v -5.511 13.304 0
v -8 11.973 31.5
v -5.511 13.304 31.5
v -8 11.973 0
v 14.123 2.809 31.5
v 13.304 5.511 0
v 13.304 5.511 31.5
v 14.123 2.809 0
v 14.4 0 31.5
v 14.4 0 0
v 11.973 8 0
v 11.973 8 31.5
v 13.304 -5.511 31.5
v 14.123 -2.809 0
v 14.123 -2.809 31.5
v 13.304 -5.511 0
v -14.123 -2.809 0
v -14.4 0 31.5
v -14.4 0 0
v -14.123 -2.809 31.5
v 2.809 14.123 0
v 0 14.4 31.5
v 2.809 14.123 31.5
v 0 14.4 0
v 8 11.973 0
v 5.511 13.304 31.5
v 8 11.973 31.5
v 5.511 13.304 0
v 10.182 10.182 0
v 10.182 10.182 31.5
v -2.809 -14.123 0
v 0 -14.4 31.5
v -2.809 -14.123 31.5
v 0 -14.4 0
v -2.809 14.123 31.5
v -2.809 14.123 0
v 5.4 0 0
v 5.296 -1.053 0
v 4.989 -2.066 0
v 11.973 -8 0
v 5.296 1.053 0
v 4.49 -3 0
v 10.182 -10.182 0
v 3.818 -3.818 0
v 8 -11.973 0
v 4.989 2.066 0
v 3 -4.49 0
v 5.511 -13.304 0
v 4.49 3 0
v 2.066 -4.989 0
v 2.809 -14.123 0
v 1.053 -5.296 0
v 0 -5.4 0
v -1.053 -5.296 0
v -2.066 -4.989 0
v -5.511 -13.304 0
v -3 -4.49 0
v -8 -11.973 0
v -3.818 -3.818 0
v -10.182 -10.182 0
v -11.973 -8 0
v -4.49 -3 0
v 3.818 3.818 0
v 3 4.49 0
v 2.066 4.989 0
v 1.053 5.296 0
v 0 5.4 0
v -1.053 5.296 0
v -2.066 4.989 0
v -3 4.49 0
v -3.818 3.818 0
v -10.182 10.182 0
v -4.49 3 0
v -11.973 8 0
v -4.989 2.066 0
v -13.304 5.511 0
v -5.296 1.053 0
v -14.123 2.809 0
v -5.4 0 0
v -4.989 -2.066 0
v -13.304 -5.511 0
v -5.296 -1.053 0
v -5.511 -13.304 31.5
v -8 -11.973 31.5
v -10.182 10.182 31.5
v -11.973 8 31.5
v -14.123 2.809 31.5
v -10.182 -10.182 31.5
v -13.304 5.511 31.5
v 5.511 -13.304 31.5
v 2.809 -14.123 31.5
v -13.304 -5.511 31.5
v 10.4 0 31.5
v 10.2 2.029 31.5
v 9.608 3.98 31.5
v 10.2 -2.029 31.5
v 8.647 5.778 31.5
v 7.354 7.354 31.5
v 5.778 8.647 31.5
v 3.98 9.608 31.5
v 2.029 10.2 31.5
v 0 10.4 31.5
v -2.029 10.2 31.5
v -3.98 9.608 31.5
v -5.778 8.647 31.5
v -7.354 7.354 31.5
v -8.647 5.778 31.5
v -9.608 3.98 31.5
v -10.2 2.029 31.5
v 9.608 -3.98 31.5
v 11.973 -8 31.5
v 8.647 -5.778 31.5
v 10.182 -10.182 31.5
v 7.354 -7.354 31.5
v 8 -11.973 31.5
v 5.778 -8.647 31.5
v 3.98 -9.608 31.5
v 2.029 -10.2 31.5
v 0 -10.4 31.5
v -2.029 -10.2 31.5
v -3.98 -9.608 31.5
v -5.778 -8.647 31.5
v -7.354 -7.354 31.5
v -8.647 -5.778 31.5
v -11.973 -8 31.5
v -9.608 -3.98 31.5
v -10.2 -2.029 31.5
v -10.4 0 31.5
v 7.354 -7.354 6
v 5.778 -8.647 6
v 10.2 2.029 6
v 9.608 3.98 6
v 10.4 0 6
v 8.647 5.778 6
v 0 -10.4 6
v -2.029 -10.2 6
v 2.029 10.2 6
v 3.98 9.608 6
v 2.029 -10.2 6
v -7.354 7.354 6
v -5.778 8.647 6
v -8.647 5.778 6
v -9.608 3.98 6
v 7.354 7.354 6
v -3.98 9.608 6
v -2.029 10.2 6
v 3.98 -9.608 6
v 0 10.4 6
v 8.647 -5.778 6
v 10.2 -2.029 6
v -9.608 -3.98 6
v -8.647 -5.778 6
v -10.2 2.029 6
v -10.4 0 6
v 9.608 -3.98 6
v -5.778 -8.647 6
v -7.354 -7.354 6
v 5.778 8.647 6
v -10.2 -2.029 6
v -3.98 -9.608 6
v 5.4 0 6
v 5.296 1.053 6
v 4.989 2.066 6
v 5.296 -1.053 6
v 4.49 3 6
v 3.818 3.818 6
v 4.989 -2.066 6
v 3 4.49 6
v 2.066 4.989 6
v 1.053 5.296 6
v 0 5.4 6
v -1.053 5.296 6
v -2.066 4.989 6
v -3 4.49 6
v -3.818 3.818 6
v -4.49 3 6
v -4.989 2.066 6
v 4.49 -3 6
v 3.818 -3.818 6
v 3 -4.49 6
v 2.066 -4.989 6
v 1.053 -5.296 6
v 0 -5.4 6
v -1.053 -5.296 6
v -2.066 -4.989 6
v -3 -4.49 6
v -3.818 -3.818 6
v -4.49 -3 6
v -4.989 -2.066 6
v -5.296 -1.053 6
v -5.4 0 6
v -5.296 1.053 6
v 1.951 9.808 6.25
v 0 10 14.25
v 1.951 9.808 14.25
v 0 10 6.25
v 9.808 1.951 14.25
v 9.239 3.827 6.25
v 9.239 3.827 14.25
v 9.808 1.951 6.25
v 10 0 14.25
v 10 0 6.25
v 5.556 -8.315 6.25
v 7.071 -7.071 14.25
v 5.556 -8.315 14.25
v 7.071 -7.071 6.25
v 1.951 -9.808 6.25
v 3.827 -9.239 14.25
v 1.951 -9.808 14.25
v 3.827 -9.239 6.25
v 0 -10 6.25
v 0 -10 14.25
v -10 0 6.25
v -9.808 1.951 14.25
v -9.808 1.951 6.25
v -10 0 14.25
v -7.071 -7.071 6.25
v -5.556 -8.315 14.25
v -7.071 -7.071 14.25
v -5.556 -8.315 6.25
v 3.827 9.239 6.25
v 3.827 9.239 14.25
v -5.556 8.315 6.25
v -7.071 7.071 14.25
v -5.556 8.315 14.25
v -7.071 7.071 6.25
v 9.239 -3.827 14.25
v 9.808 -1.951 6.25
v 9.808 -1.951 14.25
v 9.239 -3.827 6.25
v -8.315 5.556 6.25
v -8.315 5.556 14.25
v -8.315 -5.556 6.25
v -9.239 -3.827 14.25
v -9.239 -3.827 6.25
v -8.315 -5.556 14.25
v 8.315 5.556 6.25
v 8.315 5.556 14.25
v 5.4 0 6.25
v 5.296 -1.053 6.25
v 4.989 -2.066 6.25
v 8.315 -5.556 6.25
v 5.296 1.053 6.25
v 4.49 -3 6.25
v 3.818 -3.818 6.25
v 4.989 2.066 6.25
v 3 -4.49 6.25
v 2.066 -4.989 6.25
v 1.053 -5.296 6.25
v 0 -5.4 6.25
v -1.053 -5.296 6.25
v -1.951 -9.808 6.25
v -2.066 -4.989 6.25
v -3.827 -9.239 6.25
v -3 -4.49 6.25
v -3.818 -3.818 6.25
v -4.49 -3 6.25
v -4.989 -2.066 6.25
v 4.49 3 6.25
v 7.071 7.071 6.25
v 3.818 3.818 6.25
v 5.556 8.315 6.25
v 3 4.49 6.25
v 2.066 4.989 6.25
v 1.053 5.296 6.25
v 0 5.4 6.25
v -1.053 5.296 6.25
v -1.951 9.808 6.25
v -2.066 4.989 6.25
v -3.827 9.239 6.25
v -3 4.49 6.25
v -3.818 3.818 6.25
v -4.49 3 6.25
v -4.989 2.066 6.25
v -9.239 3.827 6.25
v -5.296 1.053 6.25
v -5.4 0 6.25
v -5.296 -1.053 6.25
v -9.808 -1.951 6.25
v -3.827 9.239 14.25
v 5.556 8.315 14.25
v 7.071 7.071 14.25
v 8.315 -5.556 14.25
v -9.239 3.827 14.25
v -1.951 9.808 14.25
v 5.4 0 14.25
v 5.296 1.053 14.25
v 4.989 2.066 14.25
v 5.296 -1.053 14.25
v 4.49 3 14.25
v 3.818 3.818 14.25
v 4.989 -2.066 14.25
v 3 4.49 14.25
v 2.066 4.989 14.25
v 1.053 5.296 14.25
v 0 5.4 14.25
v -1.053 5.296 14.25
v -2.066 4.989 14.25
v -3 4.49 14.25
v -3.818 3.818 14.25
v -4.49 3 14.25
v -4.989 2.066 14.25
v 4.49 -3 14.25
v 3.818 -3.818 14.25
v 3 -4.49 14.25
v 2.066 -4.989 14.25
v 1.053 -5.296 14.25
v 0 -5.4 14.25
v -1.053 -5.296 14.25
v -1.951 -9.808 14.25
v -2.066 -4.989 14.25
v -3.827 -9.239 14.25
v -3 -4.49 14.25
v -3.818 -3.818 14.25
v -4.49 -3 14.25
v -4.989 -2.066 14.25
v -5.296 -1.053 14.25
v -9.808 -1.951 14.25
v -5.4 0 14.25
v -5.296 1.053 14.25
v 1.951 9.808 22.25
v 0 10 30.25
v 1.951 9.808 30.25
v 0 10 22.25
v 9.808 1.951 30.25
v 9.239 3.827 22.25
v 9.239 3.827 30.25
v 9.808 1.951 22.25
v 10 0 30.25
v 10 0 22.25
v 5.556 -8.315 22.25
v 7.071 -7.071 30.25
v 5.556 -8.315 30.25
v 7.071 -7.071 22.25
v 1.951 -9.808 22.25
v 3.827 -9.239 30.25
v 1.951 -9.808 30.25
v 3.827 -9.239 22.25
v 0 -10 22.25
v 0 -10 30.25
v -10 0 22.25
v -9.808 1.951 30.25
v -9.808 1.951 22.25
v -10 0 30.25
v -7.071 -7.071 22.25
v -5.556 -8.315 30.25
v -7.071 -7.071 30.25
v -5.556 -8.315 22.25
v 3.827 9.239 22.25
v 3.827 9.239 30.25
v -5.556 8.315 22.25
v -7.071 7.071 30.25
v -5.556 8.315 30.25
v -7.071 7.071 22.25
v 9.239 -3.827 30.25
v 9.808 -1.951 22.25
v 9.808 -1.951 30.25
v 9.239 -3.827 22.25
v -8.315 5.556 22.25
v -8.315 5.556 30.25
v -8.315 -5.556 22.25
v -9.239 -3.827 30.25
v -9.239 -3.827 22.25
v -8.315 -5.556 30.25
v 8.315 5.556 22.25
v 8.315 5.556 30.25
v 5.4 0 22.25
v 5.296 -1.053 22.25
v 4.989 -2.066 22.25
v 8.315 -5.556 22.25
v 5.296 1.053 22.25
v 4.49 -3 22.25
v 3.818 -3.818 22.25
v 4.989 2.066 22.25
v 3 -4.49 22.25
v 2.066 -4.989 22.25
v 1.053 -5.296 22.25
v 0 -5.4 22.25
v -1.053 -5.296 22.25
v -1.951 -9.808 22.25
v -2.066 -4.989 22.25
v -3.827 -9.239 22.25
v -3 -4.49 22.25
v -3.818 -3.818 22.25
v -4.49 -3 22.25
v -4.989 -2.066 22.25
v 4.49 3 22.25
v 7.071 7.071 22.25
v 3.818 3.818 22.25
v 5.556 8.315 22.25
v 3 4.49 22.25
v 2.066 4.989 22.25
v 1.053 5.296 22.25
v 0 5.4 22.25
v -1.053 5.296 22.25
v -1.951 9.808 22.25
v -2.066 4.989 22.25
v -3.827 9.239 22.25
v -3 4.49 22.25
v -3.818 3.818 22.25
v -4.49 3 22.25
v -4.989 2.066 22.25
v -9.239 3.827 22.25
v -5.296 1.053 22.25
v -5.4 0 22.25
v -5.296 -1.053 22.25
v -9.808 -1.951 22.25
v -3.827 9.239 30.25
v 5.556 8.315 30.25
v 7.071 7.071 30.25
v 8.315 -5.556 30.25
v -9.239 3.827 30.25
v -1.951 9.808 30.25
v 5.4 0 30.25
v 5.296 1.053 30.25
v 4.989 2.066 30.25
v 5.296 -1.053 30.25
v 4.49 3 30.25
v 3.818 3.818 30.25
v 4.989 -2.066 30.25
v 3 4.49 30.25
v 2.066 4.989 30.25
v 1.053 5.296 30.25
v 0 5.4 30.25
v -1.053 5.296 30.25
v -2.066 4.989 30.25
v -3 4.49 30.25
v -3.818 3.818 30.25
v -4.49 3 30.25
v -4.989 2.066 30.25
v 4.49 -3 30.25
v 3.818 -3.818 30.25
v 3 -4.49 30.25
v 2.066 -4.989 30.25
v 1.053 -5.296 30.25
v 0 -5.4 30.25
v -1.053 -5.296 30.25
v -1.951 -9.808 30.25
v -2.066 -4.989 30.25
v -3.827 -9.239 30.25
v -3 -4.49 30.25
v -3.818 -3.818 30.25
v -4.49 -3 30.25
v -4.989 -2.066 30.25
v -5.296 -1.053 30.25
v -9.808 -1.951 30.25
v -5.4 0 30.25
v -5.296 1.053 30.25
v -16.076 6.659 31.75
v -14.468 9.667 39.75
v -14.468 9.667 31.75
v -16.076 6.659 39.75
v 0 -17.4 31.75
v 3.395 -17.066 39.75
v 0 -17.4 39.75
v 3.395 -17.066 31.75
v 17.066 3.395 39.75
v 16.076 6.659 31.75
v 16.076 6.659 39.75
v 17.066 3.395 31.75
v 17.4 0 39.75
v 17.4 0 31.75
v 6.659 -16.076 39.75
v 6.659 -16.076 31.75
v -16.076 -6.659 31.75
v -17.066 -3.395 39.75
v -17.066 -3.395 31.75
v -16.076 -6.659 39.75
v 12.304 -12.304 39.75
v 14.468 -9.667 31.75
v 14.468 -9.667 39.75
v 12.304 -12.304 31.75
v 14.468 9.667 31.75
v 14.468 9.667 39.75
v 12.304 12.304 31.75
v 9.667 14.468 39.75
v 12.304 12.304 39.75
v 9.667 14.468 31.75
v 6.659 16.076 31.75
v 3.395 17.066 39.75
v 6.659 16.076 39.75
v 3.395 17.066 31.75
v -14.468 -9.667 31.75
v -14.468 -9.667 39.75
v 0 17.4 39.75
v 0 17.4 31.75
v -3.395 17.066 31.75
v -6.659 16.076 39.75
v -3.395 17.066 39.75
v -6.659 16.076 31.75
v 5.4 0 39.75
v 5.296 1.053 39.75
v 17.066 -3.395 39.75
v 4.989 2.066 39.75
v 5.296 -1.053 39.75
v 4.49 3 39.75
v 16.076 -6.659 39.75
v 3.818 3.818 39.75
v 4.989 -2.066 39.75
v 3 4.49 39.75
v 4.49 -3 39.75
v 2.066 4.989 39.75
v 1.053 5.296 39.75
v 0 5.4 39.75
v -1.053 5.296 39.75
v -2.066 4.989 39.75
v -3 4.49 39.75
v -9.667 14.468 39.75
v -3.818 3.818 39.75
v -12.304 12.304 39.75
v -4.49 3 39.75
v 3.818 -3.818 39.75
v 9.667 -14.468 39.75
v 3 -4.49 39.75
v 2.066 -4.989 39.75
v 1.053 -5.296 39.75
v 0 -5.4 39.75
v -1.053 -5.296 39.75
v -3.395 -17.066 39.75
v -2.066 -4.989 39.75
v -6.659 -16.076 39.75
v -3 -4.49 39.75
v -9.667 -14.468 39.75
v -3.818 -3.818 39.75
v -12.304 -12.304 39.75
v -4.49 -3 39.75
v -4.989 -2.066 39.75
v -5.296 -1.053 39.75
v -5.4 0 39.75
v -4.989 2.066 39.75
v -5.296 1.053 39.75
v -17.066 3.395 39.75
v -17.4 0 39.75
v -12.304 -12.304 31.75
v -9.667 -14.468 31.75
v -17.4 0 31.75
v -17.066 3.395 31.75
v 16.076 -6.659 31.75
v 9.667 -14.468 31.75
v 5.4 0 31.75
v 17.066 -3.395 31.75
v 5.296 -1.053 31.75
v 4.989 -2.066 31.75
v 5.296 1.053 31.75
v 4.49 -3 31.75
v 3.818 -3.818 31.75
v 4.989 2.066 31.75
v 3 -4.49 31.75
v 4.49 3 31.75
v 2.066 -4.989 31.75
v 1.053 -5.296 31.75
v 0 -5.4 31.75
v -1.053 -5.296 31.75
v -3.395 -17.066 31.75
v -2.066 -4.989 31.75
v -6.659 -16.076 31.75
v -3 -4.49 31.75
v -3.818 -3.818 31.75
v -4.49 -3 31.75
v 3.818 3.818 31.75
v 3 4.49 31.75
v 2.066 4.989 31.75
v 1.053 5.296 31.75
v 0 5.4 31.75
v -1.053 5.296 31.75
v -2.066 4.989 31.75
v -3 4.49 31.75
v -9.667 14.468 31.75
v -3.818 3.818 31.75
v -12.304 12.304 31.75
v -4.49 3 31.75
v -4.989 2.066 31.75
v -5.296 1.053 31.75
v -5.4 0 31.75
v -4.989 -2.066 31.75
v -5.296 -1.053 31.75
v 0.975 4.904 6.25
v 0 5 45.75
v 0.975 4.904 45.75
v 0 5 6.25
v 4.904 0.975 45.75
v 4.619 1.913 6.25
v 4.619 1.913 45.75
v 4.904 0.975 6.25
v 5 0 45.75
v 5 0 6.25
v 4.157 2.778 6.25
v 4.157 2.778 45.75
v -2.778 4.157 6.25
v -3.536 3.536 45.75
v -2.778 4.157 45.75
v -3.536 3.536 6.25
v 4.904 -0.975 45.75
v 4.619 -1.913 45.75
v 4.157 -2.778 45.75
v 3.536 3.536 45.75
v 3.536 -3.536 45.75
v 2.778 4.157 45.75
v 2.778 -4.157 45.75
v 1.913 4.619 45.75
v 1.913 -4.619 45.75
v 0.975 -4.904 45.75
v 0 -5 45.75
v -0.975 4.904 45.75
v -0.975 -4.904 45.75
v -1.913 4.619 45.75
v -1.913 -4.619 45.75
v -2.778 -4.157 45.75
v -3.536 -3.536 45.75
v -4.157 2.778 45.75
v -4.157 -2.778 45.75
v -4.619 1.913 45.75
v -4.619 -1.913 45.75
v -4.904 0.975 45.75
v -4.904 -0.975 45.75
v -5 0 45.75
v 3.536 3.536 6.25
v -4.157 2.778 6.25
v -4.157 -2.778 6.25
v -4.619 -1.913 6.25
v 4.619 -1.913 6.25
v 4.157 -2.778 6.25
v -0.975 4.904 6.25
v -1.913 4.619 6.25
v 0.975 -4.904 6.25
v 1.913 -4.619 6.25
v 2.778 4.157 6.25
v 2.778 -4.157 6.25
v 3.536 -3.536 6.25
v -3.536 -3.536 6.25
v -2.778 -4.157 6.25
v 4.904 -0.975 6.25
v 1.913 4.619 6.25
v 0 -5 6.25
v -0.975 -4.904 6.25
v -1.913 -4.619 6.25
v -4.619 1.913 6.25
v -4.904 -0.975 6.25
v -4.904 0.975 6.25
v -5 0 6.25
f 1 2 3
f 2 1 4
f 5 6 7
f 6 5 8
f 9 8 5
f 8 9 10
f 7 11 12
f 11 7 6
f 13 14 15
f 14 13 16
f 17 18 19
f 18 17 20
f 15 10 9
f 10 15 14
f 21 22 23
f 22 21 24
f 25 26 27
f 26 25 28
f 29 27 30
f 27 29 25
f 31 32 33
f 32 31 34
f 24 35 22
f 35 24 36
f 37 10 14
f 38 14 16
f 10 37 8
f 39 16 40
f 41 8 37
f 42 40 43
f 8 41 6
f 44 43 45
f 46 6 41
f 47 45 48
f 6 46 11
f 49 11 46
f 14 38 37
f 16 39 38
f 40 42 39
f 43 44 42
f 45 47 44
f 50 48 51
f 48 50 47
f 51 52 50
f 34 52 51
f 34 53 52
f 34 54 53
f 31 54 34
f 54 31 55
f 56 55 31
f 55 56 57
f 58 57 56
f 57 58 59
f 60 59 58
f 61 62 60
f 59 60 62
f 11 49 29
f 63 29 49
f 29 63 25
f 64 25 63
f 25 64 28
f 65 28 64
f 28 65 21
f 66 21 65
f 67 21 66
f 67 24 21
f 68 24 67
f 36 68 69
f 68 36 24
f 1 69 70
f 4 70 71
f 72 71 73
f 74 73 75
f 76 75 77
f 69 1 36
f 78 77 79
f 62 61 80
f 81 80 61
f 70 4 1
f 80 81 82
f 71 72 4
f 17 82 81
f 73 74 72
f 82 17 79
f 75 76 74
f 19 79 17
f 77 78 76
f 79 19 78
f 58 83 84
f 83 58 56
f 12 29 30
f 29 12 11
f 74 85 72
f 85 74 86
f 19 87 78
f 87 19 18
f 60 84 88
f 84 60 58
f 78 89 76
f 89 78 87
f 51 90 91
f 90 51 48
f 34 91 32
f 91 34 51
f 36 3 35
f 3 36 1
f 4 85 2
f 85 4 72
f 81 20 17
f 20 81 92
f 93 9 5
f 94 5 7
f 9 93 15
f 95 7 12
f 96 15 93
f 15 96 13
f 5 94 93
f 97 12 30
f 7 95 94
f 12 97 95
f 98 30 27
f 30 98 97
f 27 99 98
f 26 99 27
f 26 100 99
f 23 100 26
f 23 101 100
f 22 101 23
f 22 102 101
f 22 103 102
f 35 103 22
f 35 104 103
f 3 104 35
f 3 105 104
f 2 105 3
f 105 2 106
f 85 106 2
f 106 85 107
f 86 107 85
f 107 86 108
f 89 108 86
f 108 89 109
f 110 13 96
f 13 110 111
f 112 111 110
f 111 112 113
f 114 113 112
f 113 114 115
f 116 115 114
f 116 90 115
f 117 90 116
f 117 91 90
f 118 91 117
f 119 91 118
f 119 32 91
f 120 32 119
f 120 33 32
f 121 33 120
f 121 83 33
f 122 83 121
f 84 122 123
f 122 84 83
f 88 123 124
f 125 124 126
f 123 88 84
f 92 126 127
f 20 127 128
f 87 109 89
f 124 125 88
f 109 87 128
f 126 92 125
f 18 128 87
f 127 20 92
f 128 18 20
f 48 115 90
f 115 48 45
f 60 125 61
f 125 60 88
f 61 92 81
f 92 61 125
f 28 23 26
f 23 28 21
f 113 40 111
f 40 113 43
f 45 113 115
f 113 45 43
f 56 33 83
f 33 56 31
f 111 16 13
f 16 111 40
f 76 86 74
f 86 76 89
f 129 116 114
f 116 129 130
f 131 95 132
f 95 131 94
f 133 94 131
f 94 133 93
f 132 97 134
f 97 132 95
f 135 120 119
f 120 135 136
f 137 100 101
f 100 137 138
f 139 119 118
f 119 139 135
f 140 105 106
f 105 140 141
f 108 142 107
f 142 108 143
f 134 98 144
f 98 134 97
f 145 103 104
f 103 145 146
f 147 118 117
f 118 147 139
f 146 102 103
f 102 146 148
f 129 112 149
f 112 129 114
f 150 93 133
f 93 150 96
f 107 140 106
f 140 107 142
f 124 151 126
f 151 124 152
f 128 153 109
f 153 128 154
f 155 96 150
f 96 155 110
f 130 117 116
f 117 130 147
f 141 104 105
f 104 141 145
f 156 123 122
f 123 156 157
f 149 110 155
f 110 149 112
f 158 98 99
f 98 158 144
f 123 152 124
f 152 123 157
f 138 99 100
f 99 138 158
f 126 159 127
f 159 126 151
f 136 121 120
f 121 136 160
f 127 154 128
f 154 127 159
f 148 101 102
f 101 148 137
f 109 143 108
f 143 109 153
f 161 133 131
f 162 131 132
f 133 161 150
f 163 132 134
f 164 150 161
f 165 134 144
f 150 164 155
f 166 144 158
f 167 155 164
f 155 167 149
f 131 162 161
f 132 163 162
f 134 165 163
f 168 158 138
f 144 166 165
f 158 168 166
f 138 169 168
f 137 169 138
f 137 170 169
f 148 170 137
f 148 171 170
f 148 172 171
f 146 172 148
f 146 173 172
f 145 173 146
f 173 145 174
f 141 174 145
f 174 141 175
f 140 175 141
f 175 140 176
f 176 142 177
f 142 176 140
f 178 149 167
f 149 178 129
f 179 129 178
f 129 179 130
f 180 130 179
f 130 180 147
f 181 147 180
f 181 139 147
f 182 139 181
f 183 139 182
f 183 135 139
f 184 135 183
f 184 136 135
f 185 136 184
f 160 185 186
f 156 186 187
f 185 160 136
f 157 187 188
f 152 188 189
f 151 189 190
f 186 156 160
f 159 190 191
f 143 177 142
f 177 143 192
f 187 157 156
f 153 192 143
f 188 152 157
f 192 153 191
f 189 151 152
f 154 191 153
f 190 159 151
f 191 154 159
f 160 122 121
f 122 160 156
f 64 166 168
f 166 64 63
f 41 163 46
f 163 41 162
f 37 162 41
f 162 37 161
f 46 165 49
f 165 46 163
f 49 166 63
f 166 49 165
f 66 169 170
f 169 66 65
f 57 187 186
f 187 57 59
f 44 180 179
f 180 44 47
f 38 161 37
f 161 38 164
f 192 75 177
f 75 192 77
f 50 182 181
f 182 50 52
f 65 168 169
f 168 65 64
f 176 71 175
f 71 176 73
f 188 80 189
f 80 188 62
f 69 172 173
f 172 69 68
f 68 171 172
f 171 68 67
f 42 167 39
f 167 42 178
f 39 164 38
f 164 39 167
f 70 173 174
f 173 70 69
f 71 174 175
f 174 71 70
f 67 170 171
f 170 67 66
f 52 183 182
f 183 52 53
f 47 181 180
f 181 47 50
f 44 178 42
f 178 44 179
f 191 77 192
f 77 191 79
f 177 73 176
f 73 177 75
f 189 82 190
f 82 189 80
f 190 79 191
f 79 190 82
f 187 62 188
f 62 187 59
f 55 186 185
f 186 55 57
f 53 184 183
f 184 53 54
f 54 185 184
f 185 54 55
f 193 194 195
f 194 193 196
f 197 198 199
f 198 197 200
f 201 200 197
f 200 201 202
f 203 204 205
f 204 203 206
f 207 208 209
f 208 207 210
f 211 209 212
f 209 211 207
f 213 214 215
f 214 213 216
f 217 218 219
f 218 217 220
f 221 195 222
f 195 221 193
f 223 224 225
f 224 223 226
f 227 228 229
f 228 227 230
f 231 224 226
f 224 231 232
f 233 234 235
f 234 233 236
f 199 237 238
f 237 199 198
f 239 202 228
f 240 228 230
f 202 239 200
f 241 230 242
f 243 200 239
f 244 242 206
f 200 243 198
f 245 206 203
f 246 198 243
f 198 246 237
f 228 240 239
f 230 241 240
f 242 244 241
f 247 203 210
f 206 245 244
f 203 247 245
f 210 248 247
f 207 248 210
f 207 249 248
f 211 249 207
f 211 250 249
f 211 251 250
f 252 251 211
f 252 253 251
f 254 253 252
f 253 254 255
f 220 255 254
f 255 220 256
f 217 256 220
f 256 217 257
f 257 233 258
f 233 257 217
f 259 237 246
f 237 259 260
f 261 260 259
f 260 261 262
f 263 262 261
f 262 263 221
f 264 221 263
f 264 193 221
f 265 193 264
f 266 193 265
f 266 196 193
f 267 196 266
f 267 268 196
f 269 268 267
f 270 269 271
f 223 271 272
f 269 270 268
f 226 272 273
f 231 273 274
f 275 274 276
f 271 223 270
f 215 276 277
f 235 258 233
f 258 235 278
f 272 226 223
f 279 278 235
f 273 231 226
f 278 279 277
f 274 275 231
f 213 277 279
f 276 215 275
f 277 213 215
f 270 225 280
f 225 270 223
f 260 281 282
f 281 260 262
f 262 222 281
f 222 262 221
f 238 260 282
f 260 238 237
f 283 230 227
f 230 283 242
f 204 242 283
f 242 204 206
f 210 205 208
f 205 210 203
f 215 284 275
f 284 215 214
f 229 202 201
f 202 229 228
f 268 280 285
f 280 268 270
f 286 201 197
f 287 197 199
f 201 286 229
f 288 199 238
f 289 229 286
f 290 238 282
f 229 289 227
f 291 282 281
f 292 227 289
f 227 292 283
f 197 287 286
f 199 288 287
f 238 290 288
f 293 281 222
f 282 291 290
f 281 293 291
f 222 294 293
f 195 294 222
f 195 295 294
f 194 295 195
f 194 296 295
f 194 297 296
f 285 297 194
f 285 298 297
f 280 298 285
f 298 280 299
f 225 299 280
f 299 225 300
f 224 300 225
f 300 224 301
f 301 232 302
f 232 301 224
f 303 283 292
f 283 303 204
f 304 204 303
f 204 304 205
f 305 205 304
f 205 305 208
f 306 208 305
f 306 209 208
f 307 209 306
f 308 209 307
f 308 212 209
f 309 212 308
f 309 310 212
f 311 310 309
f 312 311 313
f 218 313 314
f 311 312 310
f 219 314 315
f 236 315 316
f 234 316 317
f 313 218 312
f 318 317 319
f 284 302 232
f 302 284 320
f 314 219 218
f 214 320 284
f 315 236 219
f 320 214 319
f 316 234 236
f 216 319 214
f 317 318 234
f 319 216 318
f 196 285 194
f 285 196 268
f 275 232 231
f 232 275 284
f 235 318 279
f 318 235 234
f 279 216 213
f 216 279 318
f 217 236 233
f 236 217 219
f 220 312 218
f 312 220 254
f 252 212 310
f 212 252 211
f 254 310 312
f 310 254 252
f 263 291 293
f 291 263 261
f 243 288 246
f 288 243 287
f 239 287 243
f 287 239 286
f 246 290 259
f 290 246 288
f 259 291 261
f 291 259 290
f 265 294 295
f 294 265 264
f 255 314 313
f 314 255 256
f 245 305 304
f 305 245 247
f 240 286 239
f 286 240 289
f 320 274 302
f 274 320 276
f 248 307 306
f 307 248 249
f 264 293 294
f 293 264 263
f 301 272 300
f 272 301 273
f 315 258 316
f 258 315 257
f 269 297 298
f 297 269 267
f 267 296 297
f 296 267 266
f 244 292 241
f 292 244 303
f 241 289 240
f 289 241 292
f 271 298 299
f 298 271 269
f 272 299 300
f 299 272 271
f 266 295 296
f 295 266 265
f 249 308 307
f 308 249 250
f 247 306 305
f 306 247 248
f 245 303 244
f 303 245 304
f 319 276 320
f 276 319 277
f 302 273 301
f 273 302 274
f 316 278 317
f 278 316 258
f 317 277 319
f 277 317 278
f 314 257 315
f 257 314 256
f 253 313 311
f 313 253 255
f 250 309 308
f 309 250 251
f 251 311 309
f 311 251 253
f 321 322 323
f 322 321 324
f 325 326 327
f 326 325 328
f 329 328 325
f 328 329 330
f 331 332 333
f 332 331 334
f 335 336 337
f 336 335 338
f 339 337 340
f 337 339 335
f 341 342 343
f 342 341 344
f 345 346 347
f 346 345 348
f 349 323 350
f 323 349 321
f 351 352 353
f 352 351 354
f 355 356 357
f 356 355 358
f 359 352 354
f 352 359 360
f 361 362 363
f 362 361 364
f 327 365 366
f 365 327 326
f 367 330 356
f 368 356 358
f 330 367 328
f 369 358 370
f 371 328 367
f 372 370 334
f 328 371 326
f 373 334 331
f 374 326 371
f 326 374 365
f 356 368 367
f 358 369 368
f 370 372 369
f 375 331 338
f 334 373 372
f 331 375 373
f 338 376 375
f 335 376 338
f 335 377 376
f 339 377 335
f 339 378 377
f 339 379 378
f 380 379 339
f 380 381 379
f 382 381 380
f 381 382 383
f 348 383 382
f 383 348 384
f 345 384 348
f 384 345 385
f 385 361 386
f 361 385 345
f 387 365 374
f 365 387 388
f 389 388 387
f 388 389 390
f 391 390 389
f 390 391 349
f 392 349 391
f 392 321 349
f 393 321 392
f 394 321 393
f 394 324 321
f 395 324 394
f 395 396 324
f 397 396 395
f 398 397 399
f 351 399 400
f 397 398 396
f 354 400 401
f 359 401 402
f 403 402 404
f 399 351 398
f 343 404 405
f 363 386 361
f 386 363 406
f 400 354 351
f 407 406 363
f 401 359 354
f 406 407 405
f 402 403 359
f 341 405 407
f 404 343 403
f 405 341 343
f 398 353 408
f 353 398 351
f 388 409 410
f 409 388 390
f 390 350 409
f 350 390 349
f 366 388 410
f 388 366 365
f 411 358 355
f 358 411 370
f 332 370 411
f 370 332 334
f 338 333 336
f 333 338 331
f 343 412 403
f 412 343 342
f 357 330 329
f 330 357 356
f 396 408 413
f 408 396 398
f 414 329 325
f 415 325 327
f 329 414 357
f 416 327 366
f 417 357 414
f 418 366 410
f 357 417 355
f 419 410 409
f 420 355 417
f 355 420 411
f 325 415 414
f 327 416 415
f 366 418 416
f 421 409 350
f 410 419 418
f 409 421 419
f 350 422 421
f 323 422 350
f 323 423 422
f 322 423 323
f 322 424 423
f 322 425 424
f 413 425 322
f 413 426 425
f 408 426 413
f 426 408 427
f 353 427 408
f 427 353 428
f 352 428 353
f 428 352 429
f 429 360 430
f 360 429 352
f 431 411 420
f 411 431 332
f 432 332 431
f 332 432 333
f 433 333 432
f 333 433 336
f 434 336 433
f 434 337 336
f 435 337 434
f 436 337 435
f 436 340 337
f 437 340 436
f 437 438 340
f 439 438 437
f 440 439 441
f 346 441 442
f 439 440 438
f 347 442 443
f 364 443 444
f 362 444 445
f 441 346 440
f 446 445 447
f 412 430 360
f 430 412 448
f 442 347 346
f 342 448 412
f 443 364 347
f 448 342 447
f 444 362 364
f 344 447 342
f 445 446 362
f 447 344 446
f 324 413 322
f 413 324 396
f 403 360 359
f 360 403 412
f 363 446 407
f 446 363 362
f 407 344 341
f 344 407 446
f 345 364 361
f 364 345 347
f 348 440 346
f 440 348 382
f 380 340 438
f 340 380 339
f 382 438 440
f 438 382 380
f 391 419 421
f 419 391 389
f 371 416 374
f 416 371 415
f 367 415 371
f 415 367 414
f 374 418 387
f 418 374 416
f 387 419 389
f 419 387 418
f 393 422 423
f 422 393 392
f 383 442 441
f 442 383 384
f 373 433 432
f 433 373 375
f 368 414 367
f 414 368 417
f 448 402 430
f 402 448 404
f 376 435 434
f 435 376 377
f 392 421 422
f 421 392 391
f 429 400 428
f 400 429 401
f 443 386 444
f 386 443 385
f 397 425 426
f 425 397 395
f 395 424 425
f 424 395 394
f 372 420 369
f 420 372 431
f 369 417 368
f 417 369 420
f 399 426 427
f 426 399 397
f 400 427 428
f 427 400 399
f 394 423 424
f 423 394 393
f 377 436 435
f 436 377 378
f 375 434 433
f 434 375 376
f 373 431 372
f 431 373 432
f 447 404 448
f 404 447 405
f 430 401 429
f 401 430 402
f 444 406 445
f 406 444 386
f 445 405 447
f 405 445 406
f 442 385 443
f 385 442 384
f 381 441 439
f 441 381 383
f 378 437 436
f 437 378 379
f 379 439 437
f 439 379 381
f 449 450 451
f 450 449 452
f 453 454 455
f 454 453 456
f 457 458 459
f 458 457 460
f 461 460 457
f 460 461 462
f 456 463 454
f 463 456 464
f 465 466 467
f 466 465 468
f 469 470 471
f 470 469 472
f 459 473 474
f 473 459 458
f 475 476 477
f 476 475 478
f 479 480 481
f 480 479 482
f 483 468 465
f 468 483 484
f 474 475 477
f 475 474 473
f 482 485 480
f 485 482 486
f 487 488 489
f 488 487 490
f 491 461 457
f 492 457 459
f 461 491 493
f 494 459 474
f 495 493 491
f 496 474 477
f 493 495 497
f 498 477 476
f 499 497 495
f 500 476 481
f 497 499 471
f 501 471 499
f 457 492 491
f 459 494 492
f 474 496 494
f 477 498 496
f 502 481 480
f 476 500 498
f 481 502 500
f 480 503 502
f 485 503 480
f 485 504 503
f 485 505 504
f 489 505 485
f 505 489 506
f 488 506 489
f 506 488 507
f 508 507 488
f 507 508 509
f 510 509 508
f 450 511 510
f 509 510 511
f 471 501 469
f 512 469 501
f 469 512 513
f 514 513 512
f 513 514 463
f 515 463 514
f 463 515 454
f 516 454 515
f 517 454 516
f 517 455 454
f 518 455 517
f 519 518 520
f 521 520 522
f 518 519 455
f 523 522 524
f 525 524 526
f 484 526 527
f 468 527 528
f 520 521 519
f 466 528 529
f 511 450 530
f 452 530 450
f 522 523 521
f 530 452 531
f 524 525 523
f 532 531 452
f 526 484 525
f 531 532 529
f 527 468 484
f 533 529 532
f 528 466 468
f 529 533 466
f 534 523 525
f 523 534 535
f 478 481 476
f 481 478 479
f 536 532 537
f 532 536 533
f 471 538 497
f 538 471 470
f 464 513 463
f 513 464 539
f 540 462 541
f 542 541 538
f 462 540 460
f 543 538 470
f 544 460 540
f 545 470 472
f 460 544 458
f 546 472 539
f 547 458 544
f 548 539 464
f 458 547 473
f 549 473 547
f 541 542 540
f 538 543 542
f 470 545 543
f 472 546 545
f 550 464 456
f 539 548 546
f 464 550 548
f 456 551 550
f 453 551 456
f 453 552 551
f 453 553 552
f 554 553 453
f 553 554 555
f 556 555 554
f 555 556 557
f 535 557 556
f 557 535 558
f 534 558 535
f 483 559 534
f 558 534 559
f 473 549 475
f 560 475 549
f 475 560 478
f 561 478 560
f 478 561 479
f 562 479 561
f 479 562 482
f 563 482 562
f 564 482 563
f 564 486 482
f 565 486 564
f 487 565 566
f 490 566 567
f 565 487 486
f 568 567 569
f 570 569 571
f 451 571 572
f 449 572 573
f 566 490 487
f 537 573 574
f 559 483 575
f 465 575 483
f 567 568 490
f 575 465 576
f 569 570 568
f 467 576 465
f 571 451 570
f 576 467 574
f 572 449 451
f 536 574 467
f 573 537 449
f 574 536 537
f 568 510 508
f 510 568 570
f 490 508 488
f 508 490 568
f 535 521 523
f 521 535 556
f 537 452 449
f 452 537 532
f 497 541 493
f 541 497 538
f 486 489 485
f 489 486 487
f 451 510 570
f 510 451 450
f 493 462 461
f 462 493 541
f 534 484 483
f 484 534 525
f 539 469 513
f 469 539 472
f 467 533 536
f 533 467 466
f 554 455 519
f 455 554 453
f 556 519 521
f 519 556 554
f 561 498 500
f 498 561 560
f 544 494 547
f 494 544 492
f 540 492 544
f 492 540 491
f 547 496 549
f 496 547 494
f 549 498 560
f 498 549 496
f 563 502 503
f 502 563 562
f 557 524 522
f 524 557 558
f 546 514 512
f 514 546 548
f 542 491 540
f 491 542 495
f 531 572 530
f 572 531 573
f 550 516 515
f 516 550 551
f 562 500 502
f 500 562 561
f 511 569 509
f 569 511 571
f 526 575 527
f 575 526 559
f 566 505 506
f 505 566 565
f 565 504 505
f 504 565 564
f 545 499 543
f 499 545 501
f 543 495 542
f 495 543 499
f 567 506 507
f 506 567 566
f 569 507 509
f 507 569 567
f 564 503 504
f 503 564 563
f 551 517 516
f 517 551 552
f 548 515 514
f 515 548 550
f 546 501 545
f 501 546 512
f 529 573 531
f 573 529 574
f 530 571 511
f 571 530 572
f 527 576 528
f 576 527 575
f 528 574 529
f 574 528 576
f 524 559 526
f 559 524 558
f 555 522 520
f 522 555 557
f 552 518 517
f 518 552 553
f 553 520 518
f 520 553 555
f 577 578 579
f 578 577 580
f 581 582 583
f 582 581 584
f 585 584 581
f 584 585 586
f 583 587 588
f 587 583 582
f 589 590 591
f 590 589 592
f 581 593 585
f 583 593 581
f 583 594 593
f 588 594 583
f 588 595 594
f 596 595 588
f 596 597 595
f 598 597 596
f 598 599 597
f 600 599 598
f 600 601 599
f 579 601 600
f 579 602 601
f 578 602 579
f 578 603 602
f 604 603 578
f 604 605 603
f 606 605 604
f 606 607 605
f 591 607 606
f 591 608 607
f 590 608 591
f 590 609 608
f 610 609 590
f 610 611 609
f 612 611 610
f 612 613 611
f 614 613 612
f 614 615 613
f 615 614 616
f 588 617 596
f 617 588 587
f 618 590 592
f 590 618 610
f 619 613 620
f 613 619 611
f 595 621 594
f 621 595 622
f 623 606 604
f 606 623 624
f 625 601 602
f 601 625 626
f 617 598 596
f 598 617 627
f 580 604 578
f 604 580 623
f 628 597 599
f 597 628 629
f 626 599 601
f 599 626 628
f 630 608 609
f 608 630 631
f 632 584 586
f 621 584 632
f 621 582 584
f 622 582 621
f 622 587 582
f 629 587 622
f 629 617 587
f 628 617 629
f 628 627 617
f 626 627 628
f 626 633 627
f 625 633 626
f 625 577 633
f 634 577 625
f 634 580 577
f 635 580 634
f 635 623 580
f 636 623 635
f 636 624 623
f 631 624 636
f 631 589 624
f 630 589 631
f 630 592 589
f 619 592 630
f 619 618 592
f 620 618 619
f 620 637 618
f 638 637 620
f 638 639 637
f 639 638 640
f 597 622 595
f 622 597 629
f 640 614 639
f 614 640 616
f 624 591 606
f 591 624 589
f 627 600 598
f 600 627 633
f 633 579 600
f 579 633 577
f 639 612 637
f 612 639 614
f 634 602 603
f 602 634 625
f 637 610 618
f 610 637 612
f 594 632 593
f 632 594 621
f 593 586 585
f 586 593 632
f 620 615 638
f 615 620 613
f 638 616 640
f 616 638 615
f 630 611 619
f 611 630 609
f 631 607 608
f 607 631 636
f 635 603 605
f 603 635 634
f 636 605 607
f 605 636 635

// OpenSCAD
$fn = 32;

// ------------------------------------------------------------------------
// Shaft station: cup d28.8 x 31.5 mm, shaft d10
// Every part is its own module, assembly() places every instance.
// ------------------------------------------------------------------------

// --- part 1 ---
module housing_cup() {
  difference() {
    cylinder(h = 31.5, d = 28.8);
    translate([0, 0, 6]) cylinder(h = 26.5, d = 20.8);
    translate([0, 0, -1]) cylinder(h = 8, d = 10.8);
  }
}

// --- part 2 ---
module bearing_lower() {
  difference() {
      translate([0, 0, 0]) cylinder(h = 8, d = 20);
      translate([0, 0, -1]) cylinder(h = 10, d = 10.8);
    }
}

// --- part 3 ---
module bearing_upper() {
  difference() {
      translate([0, 0, 0]) cylinder(h = 8, d = 20);
      translate([0, 0, -1]) cylinder(h = 10, d = 10.8);
    }
}

// --- part 4 ---
module station_shaft() {
  translate([0, 0, -19.75]) cylinder(h = 39.5, d = 10);
}

// --- part 5 ---
module station_cover() {
  difference() {
    cylinder(h = 8, d = 34.8);
    translate([0, 0, -1]) cylinder(h = 10, d = 10.8);
  }
}

// --- assembly ---
module assembly() {
  color([0.80, 0.24, 0.20]) translate([0, 0, 0]) rotate([0, 0, 0]) housing_cup();
  color([0.20, 0.45, 0.75]) translate([0, 0, 6.25]) rotate([0, 0, 0]) bearing_lower();
  color([0.25, 0.62, 0.32]) translate([0, 0, 22.25]) rotate([0, 0, 0]) bearing_upper();
  color([0.92, 0.70, 0.18]) translate([0, 0, 26]) rotate([0, 0, 0]) station_shaft();
  color([0.58, 0.35, 0.70]) translate([0, 0, 31.75]) rotate([0, 0, 0]) station_cover();
}

assembly();
